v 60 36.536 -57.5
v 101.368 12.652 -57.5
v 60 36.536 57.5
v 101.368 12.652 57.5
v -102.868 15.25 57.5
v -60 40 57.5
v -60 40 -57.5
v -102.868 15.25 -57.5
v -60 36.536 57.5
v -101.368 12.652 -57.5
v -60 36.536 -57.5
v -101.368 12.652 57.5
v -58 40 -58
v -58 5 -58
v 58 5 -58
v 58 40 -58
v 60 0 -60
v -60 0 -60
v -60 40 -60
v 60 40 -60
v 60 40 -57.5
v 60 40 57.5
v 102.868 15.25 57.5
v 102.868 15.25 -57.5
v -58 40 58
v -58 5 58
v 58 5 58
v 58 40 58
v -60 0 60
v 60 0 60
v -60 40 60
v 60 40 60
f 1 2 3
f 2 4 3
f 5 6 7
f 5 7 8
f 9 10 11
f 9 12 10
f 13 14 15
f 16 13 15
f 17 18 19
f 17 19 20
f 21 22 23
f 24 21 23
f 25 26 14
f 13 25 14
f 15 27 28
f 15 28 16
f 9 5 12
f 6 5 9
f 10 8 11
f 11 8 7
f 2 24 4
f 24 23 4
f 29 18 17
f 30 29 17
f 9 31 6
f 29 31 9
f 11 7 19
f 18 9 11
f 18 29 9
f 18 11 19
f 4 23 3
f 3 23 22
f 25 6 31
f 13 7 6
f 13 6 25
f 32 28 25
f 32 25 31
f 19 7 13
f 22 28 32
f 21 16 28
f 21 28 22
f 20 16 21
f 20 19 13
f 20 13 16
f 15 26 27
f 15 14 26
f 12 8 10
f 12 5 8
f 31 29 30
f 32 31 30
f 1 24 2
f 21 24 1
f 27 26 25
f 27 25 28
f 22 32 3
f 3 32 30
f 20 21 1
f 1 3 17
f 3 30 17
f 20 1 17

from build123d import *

# Parameters (mm, degrees)
SKETCH1_W           = 120
SKETCH1_H           = 120
BOSS_EXTRUDE1_DEPTH = 5
SKETCH1_3_W         = 120
SKETCH1_3_H         = 120
SKETCH1_3_W_2       = 116
SKETCH1_3_H_2       = 116
BOSS_EXTRUDE2_DEPTH = 40
BOSS_EXTRUDE3_DEPTH = 57.5


with BuildPart() as part:
    # Sketch1 → Boss-Extrude1 (new body)
    with BuildSketch(Plane(origin=(0, 0, 0), x_dir=(1, 0, 0), z_dir=(0, 1, 0))):
        Rectangle(SKETCH1_W, SKETCH1_H)
    extrude(amount=BOSS_EXTRUDE1_DEPTH)

    # Sketch1<3> → Boss-Extrude2 (add)
    with BuildSketch(Plane(origin=(0, 0, 0), x_dir=(1, 0, 0), z_dir=(0, 1, 0))):
        Rectangle(SKETCH1_3_W, SKETCH1_3_H)
        Rectangle(SKETCH1_3_W_2, SKETCH1_3_H_2, mode=Mode.SUBTRACT)
    extrude(amount=BOSS_EXTRUDE2_DEPTH)

    # Sketch2 → Boss-Extrude3 (add, symmetric)
    with BuildSketch(Plane.XY):
        Polygon((60, 40), (102.868257487, 15.25), (101.368257487, 12.651923789), (60, 36.535898385), align=None)
    boss_extrude3 = extrude(amount=BOSS_EXTRUDE3_DEPTH, both=True)

    # Mirror1: Boss-Extrude3 across plane
    add(boss_extrude3.mirror(Plane(origin=(0, 0, 0), x_dir=(0, 0, 1), z_dir=(1, 0, 0))))


solid = part.part
